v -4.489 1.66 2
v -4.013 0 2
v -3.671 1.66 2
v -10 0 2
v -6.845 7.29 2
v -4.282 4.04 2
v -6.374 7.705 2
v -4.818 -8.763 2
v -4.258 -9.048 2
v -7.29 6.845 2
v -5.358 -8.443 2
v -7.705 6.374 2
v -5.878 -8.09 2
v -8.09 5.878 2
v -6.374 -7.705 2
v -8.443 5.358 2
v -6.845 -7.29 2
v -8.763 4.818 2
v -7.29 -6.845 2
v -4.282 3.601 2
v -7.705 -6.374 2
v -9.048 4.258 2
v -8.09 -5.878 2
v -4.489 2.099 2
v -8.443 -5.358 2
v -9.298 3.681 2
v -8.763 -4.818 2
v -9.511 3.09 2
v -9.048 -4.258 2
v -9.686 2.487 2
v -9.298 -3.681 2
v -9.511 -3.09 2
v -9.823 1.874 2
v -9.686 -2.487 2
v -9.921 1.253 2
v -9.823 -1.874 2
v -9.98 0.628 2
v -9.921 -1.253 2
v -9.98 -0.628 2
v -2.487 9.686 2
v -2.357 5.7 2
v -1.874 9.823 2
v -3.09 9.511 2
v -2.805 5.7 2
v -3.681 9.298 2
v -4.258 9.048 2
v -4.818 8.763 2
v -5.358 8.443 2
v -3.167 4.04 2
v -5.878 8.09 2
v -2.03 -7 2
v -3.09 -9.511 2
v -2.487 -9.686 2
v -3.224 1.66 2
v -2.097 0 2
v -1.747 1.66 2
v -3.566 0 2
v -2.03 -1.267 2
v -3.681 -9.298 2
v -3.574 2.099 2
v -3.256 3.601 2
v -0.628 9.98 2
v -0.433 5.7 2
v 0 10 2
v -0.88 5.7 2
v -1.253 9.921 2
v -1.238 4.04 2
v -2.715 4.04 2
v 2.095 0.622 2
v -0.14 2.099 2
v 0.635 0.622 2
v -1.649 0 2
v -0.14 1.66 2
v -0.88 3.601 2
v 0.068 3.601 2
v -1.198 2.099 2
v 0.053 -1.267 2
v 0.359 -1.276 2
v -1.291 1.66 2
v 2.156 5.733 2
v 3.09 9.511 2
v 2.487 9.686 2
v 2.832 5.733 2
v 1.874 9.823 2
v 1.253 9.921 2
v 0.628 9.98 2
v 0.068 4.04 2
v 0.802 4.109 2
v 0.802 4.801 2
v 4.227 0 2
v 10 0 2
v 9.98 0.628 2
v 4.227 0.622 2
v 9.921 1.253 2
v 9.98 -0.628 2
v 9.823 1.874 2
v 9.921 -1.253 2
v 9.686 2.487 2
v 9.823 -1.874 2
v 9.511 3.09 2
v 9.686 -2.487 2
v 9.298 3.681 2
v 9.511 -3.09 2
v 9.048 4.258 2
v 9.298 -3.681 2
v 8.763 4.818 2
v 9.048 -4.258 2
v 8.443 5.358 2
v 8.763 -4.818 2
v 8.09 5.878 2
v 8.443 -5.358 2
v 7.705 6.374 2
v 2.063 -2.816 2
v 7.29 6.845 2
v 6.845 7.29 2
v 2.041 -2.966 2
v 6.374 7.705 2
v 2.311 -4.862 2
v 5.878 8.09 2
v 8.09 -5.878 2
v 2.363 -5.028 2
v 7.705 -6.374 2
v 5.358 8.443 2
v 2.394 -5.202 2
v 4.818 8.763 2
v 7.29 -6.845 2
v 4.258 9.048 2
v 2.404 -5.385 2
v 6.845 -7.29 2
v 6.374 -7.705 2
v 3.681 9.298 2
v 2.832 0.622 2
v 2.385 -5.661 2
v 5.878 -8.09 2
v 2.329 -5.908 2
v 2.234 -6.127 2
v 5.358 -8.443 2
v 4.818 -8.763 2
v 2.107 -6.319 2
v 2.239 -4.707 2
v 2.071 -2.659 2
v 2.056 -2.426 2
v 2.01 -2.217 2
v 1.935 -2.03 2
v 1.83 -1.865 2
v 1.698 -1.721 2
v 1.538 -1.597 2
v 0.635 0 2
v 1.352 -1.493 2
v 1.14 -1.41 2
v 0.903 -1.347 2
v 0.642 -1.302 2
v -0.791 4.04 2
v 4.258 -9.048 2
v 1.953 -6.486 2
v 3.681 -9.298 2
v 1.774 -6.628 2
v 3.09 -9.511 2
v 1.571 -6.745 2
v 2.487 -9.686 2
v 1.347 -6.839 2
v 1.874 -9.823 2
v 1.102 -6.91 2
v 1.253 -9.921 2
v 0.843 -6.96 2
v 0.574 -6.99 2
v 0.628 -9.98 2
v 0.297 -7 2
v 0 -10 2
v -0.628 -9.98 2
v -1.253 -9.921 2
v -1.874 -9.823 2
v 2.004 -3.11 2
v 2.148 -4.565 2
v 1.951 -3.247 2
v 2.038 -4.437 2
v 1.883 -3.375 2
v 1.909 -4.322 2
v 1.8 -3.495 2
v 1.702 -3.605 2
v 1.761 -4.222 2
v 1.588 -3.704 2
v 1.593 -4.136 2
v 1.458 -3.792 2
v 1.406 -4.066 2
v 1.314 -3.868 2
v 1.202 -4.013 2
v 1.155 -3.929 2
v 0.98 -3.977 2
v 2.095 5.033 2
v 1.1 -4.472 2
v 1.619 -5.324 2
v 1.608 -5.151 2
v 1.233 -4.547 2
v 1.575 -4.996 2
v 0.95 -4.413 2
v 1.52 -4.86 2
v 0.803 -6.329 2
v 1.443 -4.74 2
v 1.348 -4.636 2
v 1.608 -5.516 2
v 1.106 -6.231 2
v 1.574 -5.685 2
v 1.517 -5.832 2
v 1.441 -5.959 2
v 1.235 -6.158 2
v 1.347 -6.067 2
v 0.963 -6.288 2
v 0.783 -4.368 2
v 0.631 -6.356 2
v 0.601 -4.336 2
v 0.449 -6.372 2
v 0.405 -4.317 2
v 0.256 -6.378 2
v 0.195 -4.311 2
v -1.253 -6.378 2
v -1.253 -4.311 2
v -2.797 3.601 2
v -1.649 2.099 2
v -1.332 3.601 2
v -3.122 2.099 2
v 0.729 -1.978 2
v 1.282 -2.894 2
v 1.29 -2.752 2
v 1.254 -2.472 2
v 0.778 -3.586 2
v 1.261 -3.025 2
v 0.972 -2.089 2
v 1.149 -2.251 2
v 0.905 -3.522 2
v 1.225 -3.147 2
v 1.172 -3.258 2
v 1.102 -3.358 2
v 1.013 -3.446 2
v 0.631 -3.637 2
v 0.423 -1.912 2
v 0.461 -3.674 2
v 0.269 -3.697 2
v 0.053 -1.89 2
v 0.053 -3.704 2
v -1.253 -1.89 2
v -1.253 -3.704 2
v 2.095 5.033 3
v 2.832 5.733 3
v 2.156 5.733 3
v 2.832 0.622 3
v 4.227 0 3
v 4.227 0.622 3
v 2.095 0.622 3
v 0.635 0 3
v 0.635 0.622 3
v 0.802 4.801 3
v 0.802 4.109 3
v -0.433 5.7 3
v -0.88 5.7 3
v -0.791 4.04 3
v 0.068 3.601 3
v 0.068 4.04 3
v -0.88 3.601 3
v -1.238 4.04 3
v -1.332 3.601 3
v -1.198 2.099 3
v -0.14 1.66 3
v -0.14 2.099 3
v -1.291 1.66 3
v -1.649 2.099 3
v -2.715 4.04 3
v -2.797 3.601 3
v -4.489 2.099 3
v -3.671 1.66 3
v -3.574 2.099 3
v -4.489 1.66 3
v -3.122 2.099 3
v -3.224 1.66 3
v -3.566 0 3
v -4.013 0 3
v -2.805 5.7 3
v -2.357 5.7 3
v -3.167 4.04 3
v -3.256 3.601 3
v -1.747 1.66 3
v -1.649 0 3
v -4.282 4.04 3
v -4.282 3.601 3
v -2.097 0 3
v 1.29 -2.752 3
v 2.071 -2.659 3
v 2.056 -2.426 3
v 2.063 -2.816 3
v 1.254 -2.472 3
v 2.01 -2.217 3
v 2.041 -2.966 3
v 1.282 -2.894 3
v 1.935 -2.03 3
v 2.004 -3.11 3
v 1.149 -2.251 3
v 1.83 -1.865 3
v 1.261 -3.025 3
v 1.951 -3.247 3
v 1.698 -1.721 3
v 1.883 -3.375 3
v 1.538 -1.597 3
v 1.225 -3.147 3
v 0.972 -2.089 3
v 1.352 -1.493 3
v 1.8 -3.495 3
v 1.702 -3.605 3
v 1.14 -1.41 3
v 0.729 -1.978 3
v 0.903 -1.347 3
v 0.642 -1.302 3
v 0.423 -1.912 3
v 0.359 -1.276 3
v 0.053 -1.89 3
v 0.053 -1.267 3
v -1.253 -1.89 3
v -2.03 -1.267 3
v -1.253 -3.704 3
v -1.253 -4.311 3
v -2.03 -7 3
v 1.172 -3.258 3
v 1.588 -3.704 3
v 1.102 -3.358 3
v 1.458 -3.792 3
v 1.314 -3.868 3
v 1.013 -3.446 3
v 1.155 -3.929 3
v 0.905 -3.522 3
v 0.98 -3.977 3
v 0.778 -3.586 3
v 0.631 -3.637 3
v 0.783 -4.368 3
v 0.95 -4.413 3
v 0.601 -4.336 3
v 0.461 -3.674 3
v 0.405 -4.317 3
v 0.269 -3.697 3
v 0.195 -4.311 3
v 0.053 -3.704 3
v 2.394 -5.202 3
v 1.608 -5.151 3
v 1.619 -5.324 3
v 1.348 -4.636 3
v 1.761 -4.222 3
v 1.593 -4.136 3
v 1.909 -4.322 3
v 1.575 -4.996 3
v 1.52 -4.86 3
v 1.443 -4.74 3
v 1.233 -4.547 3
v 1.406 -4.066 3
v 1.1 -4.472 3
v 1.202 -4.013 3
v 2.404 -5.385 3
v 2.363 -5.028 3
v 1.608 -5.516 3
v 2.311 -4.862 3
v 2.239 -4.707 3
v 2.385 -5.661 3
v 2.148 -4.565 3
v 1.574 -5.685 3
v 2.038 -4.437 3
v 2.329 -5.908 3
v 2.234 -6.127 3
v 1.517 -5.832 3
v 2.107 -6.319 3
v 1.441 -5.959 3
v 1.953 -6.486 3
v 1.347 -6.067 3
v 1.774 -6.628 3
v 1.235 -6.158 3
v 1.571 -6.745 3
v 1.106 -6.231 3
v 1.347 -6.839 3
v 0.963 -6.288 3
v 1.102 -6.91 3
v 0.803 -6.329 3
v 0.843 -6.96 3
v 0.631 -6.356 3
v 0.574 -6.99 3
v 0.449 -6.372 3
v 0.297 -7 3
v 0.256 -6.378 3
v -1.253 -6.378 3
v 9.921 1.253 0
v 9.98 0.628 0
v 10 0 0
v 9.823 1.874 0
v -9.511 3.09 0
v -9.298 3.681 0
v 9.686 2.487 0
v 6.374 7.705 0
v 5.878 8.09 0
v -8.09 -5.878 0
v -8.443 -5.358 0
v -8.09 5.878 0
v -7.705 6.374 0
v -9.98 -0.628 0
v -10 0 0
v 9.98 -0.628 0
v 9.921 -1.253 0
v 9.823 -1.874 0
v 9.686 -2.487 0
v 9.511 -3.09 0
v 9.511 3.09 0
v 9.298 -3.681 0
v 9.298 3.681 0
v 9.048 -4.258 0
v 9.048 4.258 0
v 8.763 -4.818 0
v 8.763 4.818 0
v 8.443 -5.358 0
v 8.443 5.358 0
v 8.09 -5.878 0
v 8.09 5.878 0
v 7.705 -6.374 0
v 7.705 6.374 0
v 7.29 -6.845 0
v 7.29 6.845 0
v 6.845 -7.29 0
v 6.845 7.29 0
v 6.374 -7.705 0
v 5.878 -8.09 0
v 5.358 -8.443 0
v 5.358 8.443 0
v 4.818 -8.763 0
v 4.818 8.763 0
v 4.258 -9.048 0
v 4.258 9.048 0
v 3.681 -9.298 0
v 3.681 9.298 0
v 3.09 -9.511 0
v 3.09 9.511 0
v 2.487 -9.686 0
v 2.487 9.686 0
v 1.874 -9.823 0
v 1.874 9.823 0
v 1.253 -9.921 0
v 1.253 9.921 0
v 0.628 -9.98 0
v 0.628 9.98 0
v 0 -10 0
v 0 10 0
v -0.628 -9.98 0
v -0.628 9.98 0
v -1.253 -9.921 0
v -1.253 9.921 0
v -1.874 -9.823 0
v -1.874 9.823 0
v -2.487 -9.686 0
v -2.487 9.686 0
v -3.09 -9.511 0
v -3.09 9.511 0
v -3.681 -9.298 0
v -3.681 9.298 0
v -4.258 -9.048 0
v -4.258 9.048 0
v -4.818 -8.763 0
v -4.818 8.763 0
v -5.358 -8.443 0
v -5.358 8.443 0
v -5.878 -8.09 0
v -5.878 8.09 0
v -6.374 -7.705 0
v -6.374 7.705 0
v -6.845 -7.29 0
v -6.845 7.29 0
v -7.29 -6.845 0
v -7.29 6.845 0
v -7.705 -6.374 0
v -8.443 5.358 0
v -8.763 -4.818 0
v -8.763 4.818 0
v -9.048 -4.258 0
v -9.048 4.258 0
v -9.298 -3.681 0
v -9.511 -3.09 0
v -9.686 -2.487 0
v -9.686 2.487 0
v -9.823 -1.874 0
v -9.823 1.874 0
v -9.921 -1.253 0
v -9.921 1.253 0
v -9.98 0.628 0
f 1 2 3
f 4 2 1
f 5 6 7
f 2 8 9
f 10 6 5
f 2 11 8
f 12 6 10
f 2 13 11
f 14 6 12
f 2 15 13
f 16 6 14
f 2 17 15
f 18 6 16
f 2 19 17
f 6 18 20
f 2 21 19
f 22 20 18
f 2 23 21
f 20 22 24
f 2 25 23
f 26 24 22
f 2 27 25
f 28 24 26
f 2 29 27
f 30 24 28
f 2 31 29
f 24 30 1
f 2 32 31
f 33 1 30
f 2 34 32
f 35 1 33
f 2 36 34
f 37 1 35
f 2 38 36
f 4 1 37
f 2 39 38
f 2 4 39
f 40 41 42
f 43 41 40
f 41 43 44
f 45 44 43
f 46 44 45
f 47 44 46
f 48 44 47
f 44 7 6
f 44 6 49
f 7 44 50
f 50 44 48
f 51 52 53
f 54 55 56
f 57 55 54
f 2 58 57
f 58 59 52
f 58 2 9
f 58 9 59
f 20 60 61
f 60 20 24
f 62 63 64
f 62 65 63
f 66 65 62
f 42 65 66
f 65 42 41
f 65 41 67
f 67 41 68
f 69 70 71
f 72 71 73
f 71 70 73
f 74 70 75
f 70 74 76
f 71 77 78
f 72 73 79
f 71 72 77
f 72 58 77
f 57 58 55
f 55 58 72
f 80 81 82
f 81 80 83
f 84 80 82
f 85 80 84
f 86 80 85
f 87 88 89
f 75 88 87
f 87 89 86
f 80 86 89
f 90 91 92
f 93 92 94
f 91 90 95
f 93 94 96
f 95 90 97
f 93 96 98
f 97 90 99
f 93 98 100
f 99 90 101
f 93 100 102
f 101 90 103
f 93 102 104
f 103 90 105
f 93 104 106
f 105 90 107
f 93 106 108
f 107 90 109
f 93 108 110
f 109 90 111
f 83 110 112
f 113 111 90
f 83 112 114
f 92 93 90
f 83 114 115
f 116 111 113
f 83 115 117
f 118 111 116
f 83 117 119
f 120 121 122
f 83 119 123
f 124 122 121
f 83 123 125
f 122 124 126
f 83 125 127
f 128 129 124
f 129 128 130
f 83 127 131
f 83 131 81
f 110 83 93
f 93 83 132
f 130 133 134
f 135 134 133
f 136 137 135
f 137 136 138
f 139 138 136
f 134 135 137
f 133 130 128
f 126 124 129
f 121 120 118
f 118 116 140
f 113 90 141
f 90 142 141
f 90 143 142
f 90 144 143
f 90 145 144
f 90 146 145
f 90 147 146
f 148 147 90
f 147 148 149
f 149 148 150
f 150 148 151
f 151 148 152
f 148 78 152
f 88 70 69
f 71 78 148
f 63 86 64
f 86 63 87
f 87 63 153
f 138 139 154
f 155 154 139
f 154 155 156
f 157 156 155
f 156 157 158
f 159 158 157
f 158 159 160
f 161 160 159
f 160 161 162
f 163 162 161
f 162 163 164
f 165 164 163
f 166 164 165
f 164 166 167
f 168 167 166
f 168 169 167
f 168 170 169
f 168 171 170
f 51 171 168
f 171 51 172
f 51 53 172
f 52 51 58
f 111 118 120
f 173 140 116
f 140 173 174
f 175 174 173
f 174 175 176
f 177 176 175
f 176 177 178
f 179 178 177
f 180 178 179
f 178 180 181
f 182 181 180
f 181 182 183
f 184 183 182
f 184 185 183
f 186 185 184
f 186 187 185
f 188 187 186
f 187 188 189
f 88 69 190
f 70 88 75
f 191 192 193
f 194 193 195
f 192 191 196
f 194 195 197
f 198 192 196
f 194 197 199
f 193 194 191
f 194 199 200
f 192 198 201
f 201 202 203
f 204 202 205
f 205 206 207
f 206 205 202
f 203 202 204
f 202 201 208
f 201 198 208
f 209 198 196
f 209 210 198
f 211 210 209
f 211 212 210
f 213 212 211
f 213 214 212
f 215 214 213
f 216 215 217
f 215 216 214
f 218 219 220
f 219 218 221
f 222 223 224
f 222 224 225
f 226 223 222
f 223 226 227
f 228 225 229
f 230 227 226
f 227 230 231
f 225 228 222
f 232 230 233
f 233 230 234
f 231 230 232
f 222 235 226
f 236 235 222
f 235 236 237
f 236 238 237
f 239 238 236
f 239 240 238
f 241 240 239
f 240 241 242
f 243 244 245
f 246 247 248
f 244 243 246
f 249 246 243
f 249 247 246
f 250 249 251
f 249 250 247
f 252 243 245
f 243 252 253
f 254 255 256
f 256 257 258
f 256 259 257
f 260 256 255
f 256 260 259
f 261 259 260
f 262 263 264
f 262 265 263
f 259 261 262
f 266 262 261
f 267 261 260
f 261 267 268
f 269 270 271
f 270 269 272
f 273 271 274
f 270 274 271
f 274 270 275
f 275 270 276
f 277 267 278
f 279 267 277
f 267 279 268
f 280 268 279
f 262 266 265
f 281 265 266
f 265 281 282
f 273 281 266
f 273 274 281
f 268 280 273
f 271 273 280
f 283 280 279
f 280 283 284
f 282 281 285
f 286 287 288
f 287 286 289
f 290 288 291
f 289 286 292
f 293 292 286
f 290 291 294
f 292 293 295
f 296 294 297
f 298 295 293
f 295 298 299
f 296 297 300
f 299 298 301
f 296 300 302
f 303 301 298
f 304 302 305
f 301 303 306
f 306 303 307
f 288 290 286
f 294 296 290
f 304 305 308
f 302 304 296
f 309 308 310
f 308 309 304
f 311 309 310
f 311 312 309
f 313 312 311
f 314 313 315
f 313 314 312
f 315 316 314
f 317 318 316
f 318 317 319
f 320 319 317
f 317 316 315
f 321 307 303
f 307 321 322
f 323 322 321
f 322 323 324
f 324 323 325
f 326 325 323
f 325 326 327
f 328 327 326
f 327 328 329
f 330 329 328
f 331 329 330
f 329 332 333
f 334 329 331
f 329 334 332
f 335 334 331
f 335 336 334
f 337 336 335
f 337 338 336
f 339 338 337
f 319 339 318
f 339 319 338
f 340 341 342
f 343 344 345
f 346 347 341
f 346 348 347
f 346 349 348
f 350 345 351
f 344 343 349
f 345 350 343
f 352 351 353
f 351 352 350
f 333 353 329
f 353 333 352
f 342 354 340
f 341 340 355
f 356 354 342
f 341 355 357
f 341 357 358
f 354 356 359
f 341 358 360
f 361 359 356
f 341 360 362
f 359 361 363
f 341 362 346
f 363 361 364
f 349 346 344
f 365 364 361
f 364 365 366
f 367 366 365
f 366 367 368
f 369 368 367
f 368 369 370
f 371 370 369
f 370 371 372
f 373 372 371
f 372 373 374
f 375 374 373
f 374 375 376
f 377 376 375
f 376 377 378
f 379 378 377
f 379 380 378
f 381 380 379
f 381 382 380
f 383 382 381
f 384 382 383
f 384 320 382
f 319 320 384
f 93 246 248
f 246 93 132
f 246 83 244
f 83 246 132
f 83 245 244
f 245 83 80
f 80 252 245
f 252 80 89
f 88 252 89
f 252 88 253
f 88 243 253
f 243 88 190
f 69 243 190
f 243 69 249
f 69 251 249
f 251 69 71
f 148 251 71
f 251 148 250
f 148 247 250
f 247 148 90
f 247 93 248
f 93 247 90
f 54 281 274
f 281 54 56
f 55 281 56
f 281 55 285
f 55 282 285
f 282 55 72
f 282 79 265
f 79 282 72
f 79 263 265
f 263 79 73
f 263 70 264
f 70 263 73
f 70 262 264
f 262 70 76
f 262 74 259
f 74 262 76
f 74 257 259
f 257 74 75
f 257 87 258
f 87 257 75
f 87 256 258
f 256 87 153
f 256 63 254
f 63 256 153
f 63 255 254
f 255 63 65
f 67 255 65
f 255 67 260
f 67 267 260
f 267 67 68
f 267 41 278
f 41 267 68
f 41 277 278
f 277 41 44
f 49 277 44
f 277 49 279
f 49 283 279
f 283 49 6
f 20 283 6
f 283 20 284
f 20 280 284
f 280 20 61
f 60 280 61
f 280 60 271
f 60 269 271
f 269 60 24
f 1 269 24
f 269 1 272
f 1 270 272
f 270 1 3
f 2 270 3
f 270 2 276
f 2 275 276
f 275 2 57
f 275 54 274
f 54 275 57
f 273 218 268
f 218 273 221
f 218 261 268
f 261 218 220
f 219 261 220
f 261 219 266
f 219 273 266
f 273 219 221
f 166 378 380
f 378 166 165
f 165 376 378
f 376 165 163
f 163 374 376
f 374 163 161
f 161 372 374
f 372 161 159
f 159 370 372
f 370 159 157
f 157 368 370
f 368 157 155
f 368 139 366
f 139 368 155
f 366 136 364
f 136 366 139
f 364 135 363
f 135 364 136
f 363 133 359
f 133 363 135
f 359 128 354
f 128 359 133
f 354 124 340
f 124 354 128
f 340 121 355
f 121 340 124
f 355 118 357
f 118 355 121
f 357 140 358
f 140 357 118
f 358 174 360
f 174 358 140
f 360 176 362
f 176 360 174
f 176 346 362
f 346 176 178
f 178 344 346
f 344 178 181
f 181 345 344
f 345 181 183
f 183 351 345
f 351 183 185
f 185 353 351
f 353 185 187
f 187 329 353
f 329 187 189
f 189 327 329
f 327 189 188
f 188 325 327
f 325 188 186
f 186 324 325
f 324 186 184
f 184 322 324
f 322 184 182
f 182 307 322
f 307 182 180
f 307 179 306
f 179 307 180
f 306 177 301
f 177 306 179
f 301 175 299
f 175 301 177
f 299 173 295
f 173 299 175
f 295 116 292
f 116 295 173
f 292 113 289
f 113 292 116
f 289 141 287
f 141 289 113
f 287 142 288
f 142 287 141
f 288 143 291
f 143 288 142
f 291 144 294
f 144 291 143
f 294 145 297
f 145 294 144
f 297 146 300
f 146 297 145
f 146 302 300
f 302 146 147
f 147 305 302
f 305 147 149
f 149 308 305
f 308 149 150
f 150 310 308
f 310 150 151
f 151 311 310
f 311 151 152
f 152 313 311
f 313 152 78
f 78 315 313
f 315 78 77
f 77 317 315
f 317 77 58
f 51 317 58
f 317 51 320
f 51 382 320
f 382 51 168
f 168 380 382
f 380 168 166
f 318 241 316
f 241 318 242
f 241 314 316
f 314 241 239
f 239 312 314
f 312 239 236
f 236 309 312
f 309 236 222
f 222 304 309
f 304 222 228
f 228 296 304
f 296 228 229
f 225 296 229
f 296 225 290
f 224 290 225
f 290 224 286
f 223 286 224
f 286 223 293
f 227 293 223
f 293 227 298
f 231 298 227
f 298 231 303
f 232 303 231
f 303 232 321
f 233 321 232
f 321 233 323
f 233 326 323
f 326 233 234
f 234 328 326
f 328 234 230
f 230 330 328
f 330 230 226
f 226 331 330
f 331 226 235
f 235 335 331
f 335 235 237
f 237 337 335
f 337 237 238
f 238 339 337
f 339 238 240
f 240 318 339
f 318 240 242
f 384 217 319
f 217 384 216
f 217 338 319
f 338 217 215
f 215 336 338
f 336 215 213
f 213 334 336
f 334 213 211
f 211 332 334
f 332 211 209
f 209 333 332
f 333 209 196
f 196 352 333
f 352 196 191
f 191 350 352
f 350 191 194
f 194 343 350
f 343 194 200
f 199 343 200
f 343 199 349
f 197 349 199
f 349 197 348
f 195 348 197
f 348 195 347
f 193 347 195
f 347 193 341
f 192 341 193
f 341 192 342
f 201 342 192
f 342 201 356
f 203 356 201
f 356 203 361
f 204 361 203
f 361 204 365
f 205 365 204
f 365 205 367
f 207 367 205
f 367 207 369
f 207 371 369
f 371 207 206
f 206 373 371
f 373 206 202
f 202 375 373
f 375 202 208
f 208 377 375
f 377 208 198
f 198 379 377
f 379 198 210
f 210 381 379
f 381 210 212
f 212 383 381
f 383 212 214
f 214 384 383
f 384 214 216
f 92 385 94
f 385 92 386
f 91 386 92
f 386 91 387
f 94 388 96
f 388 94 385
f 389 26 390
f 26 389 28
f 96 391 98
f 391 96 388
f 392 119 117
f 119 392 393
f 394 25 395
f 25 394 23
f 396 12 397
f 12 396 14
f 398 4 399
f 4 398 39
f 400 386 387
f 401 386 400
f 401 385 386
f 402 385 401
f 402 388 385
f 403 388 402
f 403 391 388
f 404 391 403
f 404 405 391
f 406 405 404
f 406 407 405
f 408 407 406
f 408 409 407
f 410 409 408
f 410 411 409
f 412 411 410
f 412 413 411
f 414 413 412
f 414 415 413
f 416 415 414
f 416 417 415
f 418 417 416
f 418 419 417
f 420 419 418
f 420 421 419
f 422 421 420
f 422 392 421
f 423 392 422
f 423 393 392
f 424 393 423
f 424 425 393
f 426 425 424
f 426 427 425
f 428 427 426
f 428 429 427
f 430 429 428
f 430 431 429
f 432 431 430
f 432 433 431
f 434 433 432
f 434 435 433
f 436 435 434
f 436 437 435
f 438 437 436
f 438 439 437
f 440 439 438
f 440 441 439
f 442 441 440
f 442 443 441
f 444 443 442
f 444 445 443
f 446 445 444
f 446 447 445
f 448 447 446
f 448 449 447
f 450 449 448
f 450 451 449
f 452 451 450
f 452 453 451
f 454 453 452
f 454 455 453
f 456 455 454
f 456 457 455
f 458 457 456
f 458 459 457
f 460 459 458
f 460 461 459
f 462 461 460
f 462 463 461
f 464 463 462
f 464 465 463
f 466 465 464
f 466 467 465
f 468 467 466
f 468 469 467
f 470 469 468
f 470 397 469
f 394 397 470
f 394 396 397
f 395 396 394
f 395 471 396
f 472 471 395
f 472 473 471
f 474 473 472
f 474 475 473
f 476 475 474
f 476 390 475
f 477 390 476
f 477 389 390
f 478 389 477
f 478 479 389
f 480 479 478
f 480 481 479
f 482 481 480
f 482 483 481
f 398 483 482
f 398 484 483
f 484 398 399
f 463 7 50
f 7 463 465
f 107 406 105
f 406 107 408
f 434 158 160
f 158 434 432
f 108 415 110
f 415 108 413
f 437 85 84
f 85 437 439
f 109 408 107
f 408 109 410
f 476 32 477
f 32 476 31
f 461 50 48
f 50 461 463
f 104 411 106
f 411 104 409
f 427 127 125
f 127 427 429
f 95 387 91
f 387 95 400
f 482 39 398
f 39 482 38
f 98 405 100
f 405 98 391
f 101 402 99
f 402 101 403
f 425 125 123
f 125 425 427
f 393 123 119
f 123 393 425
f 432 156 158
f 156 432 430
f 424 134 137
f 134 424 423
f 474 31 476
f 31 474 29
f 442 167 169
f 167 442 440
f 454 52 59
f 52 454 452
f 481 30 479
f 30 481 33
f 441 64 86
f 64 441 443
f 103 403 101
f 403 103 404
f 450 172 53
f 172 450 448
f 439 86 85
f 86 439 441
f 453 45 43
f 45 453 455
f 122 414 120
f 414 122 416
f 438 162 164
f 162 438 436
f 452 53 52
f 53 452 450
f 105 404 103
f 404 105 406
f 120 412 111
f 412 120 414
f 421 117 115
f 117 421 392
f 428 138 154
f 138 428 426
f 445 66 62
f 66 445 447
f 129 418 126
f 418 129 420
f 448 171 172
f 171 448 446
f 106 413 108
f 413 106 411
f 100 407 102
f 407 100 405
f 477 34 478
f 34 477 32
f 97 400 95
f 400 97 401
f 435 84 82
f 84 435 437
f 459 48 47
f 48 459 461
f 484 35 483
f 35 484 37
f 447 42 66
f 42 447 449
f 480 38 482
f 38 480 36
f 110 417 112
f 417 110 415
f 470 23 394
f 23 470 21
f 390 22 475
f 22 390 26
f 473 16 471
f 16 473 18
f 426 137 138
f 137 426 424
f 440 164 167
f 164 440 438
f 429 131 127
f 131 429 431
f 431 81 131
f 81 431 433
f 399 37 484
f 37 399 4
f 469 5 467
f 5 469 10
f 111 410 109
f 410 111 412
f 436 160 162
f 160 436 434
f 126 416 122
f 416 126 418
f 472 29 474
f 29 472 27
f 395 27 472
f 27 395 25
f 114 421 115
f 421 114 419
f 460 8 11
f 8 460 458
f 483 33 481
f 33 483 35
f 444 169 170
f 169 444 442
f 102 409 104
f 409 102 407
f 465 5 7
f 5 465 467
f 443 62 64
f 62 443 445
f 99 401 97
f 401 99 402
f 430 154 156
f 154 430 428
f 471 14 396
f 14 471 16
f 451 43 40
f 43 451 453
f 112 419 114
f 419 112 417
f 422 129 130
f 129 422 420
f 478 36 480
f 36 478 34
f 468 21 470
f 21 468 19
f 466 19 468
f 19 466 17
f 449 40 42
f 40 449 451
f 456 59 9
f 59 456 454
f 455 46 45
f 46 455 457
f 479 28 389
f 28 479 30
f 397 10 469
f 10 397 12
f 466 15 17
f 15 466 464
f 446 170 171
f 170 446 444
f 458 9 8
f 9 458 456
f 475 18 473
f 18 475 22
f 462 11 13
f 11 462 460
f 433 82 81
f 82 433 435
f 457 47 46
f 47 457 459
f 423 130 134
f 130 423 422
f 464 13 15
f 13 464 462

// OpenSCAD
/*
    Author: Kevin Lutzer
    Date Created: Oct 22 2016
    Description: A little coin for my bro
*/

/////////////////////////////////////////////////// Parameters /////////////////////////////////////////////////

coin_diameter = 20;
coin_thickness = 2; 
text_size = 6;
text_depth = coin_thickness-1;

/////////////////////////////////////////////////// Prototypes /////////////////////////////////////////////////

coin();

/////////////////////////////////////////////////// Modules //////////////////////////////////////////////////

module coin(){
    union(){     
        translate([0,0,coin_thickness]){
            needed_text();
        }
        cylinder(coin_thickness, d1 = coin_diameter, d2 = coin_diameter, $fn=100);
    }
}

module needed_text(){
    linear_extrude(height = text_depth) {  
        text("#1", size=text_size, halign="center"); 
            translate([0,-text_size - 1,0]){
                text("B", size=text_size, halign="center");
            }
        }
}
